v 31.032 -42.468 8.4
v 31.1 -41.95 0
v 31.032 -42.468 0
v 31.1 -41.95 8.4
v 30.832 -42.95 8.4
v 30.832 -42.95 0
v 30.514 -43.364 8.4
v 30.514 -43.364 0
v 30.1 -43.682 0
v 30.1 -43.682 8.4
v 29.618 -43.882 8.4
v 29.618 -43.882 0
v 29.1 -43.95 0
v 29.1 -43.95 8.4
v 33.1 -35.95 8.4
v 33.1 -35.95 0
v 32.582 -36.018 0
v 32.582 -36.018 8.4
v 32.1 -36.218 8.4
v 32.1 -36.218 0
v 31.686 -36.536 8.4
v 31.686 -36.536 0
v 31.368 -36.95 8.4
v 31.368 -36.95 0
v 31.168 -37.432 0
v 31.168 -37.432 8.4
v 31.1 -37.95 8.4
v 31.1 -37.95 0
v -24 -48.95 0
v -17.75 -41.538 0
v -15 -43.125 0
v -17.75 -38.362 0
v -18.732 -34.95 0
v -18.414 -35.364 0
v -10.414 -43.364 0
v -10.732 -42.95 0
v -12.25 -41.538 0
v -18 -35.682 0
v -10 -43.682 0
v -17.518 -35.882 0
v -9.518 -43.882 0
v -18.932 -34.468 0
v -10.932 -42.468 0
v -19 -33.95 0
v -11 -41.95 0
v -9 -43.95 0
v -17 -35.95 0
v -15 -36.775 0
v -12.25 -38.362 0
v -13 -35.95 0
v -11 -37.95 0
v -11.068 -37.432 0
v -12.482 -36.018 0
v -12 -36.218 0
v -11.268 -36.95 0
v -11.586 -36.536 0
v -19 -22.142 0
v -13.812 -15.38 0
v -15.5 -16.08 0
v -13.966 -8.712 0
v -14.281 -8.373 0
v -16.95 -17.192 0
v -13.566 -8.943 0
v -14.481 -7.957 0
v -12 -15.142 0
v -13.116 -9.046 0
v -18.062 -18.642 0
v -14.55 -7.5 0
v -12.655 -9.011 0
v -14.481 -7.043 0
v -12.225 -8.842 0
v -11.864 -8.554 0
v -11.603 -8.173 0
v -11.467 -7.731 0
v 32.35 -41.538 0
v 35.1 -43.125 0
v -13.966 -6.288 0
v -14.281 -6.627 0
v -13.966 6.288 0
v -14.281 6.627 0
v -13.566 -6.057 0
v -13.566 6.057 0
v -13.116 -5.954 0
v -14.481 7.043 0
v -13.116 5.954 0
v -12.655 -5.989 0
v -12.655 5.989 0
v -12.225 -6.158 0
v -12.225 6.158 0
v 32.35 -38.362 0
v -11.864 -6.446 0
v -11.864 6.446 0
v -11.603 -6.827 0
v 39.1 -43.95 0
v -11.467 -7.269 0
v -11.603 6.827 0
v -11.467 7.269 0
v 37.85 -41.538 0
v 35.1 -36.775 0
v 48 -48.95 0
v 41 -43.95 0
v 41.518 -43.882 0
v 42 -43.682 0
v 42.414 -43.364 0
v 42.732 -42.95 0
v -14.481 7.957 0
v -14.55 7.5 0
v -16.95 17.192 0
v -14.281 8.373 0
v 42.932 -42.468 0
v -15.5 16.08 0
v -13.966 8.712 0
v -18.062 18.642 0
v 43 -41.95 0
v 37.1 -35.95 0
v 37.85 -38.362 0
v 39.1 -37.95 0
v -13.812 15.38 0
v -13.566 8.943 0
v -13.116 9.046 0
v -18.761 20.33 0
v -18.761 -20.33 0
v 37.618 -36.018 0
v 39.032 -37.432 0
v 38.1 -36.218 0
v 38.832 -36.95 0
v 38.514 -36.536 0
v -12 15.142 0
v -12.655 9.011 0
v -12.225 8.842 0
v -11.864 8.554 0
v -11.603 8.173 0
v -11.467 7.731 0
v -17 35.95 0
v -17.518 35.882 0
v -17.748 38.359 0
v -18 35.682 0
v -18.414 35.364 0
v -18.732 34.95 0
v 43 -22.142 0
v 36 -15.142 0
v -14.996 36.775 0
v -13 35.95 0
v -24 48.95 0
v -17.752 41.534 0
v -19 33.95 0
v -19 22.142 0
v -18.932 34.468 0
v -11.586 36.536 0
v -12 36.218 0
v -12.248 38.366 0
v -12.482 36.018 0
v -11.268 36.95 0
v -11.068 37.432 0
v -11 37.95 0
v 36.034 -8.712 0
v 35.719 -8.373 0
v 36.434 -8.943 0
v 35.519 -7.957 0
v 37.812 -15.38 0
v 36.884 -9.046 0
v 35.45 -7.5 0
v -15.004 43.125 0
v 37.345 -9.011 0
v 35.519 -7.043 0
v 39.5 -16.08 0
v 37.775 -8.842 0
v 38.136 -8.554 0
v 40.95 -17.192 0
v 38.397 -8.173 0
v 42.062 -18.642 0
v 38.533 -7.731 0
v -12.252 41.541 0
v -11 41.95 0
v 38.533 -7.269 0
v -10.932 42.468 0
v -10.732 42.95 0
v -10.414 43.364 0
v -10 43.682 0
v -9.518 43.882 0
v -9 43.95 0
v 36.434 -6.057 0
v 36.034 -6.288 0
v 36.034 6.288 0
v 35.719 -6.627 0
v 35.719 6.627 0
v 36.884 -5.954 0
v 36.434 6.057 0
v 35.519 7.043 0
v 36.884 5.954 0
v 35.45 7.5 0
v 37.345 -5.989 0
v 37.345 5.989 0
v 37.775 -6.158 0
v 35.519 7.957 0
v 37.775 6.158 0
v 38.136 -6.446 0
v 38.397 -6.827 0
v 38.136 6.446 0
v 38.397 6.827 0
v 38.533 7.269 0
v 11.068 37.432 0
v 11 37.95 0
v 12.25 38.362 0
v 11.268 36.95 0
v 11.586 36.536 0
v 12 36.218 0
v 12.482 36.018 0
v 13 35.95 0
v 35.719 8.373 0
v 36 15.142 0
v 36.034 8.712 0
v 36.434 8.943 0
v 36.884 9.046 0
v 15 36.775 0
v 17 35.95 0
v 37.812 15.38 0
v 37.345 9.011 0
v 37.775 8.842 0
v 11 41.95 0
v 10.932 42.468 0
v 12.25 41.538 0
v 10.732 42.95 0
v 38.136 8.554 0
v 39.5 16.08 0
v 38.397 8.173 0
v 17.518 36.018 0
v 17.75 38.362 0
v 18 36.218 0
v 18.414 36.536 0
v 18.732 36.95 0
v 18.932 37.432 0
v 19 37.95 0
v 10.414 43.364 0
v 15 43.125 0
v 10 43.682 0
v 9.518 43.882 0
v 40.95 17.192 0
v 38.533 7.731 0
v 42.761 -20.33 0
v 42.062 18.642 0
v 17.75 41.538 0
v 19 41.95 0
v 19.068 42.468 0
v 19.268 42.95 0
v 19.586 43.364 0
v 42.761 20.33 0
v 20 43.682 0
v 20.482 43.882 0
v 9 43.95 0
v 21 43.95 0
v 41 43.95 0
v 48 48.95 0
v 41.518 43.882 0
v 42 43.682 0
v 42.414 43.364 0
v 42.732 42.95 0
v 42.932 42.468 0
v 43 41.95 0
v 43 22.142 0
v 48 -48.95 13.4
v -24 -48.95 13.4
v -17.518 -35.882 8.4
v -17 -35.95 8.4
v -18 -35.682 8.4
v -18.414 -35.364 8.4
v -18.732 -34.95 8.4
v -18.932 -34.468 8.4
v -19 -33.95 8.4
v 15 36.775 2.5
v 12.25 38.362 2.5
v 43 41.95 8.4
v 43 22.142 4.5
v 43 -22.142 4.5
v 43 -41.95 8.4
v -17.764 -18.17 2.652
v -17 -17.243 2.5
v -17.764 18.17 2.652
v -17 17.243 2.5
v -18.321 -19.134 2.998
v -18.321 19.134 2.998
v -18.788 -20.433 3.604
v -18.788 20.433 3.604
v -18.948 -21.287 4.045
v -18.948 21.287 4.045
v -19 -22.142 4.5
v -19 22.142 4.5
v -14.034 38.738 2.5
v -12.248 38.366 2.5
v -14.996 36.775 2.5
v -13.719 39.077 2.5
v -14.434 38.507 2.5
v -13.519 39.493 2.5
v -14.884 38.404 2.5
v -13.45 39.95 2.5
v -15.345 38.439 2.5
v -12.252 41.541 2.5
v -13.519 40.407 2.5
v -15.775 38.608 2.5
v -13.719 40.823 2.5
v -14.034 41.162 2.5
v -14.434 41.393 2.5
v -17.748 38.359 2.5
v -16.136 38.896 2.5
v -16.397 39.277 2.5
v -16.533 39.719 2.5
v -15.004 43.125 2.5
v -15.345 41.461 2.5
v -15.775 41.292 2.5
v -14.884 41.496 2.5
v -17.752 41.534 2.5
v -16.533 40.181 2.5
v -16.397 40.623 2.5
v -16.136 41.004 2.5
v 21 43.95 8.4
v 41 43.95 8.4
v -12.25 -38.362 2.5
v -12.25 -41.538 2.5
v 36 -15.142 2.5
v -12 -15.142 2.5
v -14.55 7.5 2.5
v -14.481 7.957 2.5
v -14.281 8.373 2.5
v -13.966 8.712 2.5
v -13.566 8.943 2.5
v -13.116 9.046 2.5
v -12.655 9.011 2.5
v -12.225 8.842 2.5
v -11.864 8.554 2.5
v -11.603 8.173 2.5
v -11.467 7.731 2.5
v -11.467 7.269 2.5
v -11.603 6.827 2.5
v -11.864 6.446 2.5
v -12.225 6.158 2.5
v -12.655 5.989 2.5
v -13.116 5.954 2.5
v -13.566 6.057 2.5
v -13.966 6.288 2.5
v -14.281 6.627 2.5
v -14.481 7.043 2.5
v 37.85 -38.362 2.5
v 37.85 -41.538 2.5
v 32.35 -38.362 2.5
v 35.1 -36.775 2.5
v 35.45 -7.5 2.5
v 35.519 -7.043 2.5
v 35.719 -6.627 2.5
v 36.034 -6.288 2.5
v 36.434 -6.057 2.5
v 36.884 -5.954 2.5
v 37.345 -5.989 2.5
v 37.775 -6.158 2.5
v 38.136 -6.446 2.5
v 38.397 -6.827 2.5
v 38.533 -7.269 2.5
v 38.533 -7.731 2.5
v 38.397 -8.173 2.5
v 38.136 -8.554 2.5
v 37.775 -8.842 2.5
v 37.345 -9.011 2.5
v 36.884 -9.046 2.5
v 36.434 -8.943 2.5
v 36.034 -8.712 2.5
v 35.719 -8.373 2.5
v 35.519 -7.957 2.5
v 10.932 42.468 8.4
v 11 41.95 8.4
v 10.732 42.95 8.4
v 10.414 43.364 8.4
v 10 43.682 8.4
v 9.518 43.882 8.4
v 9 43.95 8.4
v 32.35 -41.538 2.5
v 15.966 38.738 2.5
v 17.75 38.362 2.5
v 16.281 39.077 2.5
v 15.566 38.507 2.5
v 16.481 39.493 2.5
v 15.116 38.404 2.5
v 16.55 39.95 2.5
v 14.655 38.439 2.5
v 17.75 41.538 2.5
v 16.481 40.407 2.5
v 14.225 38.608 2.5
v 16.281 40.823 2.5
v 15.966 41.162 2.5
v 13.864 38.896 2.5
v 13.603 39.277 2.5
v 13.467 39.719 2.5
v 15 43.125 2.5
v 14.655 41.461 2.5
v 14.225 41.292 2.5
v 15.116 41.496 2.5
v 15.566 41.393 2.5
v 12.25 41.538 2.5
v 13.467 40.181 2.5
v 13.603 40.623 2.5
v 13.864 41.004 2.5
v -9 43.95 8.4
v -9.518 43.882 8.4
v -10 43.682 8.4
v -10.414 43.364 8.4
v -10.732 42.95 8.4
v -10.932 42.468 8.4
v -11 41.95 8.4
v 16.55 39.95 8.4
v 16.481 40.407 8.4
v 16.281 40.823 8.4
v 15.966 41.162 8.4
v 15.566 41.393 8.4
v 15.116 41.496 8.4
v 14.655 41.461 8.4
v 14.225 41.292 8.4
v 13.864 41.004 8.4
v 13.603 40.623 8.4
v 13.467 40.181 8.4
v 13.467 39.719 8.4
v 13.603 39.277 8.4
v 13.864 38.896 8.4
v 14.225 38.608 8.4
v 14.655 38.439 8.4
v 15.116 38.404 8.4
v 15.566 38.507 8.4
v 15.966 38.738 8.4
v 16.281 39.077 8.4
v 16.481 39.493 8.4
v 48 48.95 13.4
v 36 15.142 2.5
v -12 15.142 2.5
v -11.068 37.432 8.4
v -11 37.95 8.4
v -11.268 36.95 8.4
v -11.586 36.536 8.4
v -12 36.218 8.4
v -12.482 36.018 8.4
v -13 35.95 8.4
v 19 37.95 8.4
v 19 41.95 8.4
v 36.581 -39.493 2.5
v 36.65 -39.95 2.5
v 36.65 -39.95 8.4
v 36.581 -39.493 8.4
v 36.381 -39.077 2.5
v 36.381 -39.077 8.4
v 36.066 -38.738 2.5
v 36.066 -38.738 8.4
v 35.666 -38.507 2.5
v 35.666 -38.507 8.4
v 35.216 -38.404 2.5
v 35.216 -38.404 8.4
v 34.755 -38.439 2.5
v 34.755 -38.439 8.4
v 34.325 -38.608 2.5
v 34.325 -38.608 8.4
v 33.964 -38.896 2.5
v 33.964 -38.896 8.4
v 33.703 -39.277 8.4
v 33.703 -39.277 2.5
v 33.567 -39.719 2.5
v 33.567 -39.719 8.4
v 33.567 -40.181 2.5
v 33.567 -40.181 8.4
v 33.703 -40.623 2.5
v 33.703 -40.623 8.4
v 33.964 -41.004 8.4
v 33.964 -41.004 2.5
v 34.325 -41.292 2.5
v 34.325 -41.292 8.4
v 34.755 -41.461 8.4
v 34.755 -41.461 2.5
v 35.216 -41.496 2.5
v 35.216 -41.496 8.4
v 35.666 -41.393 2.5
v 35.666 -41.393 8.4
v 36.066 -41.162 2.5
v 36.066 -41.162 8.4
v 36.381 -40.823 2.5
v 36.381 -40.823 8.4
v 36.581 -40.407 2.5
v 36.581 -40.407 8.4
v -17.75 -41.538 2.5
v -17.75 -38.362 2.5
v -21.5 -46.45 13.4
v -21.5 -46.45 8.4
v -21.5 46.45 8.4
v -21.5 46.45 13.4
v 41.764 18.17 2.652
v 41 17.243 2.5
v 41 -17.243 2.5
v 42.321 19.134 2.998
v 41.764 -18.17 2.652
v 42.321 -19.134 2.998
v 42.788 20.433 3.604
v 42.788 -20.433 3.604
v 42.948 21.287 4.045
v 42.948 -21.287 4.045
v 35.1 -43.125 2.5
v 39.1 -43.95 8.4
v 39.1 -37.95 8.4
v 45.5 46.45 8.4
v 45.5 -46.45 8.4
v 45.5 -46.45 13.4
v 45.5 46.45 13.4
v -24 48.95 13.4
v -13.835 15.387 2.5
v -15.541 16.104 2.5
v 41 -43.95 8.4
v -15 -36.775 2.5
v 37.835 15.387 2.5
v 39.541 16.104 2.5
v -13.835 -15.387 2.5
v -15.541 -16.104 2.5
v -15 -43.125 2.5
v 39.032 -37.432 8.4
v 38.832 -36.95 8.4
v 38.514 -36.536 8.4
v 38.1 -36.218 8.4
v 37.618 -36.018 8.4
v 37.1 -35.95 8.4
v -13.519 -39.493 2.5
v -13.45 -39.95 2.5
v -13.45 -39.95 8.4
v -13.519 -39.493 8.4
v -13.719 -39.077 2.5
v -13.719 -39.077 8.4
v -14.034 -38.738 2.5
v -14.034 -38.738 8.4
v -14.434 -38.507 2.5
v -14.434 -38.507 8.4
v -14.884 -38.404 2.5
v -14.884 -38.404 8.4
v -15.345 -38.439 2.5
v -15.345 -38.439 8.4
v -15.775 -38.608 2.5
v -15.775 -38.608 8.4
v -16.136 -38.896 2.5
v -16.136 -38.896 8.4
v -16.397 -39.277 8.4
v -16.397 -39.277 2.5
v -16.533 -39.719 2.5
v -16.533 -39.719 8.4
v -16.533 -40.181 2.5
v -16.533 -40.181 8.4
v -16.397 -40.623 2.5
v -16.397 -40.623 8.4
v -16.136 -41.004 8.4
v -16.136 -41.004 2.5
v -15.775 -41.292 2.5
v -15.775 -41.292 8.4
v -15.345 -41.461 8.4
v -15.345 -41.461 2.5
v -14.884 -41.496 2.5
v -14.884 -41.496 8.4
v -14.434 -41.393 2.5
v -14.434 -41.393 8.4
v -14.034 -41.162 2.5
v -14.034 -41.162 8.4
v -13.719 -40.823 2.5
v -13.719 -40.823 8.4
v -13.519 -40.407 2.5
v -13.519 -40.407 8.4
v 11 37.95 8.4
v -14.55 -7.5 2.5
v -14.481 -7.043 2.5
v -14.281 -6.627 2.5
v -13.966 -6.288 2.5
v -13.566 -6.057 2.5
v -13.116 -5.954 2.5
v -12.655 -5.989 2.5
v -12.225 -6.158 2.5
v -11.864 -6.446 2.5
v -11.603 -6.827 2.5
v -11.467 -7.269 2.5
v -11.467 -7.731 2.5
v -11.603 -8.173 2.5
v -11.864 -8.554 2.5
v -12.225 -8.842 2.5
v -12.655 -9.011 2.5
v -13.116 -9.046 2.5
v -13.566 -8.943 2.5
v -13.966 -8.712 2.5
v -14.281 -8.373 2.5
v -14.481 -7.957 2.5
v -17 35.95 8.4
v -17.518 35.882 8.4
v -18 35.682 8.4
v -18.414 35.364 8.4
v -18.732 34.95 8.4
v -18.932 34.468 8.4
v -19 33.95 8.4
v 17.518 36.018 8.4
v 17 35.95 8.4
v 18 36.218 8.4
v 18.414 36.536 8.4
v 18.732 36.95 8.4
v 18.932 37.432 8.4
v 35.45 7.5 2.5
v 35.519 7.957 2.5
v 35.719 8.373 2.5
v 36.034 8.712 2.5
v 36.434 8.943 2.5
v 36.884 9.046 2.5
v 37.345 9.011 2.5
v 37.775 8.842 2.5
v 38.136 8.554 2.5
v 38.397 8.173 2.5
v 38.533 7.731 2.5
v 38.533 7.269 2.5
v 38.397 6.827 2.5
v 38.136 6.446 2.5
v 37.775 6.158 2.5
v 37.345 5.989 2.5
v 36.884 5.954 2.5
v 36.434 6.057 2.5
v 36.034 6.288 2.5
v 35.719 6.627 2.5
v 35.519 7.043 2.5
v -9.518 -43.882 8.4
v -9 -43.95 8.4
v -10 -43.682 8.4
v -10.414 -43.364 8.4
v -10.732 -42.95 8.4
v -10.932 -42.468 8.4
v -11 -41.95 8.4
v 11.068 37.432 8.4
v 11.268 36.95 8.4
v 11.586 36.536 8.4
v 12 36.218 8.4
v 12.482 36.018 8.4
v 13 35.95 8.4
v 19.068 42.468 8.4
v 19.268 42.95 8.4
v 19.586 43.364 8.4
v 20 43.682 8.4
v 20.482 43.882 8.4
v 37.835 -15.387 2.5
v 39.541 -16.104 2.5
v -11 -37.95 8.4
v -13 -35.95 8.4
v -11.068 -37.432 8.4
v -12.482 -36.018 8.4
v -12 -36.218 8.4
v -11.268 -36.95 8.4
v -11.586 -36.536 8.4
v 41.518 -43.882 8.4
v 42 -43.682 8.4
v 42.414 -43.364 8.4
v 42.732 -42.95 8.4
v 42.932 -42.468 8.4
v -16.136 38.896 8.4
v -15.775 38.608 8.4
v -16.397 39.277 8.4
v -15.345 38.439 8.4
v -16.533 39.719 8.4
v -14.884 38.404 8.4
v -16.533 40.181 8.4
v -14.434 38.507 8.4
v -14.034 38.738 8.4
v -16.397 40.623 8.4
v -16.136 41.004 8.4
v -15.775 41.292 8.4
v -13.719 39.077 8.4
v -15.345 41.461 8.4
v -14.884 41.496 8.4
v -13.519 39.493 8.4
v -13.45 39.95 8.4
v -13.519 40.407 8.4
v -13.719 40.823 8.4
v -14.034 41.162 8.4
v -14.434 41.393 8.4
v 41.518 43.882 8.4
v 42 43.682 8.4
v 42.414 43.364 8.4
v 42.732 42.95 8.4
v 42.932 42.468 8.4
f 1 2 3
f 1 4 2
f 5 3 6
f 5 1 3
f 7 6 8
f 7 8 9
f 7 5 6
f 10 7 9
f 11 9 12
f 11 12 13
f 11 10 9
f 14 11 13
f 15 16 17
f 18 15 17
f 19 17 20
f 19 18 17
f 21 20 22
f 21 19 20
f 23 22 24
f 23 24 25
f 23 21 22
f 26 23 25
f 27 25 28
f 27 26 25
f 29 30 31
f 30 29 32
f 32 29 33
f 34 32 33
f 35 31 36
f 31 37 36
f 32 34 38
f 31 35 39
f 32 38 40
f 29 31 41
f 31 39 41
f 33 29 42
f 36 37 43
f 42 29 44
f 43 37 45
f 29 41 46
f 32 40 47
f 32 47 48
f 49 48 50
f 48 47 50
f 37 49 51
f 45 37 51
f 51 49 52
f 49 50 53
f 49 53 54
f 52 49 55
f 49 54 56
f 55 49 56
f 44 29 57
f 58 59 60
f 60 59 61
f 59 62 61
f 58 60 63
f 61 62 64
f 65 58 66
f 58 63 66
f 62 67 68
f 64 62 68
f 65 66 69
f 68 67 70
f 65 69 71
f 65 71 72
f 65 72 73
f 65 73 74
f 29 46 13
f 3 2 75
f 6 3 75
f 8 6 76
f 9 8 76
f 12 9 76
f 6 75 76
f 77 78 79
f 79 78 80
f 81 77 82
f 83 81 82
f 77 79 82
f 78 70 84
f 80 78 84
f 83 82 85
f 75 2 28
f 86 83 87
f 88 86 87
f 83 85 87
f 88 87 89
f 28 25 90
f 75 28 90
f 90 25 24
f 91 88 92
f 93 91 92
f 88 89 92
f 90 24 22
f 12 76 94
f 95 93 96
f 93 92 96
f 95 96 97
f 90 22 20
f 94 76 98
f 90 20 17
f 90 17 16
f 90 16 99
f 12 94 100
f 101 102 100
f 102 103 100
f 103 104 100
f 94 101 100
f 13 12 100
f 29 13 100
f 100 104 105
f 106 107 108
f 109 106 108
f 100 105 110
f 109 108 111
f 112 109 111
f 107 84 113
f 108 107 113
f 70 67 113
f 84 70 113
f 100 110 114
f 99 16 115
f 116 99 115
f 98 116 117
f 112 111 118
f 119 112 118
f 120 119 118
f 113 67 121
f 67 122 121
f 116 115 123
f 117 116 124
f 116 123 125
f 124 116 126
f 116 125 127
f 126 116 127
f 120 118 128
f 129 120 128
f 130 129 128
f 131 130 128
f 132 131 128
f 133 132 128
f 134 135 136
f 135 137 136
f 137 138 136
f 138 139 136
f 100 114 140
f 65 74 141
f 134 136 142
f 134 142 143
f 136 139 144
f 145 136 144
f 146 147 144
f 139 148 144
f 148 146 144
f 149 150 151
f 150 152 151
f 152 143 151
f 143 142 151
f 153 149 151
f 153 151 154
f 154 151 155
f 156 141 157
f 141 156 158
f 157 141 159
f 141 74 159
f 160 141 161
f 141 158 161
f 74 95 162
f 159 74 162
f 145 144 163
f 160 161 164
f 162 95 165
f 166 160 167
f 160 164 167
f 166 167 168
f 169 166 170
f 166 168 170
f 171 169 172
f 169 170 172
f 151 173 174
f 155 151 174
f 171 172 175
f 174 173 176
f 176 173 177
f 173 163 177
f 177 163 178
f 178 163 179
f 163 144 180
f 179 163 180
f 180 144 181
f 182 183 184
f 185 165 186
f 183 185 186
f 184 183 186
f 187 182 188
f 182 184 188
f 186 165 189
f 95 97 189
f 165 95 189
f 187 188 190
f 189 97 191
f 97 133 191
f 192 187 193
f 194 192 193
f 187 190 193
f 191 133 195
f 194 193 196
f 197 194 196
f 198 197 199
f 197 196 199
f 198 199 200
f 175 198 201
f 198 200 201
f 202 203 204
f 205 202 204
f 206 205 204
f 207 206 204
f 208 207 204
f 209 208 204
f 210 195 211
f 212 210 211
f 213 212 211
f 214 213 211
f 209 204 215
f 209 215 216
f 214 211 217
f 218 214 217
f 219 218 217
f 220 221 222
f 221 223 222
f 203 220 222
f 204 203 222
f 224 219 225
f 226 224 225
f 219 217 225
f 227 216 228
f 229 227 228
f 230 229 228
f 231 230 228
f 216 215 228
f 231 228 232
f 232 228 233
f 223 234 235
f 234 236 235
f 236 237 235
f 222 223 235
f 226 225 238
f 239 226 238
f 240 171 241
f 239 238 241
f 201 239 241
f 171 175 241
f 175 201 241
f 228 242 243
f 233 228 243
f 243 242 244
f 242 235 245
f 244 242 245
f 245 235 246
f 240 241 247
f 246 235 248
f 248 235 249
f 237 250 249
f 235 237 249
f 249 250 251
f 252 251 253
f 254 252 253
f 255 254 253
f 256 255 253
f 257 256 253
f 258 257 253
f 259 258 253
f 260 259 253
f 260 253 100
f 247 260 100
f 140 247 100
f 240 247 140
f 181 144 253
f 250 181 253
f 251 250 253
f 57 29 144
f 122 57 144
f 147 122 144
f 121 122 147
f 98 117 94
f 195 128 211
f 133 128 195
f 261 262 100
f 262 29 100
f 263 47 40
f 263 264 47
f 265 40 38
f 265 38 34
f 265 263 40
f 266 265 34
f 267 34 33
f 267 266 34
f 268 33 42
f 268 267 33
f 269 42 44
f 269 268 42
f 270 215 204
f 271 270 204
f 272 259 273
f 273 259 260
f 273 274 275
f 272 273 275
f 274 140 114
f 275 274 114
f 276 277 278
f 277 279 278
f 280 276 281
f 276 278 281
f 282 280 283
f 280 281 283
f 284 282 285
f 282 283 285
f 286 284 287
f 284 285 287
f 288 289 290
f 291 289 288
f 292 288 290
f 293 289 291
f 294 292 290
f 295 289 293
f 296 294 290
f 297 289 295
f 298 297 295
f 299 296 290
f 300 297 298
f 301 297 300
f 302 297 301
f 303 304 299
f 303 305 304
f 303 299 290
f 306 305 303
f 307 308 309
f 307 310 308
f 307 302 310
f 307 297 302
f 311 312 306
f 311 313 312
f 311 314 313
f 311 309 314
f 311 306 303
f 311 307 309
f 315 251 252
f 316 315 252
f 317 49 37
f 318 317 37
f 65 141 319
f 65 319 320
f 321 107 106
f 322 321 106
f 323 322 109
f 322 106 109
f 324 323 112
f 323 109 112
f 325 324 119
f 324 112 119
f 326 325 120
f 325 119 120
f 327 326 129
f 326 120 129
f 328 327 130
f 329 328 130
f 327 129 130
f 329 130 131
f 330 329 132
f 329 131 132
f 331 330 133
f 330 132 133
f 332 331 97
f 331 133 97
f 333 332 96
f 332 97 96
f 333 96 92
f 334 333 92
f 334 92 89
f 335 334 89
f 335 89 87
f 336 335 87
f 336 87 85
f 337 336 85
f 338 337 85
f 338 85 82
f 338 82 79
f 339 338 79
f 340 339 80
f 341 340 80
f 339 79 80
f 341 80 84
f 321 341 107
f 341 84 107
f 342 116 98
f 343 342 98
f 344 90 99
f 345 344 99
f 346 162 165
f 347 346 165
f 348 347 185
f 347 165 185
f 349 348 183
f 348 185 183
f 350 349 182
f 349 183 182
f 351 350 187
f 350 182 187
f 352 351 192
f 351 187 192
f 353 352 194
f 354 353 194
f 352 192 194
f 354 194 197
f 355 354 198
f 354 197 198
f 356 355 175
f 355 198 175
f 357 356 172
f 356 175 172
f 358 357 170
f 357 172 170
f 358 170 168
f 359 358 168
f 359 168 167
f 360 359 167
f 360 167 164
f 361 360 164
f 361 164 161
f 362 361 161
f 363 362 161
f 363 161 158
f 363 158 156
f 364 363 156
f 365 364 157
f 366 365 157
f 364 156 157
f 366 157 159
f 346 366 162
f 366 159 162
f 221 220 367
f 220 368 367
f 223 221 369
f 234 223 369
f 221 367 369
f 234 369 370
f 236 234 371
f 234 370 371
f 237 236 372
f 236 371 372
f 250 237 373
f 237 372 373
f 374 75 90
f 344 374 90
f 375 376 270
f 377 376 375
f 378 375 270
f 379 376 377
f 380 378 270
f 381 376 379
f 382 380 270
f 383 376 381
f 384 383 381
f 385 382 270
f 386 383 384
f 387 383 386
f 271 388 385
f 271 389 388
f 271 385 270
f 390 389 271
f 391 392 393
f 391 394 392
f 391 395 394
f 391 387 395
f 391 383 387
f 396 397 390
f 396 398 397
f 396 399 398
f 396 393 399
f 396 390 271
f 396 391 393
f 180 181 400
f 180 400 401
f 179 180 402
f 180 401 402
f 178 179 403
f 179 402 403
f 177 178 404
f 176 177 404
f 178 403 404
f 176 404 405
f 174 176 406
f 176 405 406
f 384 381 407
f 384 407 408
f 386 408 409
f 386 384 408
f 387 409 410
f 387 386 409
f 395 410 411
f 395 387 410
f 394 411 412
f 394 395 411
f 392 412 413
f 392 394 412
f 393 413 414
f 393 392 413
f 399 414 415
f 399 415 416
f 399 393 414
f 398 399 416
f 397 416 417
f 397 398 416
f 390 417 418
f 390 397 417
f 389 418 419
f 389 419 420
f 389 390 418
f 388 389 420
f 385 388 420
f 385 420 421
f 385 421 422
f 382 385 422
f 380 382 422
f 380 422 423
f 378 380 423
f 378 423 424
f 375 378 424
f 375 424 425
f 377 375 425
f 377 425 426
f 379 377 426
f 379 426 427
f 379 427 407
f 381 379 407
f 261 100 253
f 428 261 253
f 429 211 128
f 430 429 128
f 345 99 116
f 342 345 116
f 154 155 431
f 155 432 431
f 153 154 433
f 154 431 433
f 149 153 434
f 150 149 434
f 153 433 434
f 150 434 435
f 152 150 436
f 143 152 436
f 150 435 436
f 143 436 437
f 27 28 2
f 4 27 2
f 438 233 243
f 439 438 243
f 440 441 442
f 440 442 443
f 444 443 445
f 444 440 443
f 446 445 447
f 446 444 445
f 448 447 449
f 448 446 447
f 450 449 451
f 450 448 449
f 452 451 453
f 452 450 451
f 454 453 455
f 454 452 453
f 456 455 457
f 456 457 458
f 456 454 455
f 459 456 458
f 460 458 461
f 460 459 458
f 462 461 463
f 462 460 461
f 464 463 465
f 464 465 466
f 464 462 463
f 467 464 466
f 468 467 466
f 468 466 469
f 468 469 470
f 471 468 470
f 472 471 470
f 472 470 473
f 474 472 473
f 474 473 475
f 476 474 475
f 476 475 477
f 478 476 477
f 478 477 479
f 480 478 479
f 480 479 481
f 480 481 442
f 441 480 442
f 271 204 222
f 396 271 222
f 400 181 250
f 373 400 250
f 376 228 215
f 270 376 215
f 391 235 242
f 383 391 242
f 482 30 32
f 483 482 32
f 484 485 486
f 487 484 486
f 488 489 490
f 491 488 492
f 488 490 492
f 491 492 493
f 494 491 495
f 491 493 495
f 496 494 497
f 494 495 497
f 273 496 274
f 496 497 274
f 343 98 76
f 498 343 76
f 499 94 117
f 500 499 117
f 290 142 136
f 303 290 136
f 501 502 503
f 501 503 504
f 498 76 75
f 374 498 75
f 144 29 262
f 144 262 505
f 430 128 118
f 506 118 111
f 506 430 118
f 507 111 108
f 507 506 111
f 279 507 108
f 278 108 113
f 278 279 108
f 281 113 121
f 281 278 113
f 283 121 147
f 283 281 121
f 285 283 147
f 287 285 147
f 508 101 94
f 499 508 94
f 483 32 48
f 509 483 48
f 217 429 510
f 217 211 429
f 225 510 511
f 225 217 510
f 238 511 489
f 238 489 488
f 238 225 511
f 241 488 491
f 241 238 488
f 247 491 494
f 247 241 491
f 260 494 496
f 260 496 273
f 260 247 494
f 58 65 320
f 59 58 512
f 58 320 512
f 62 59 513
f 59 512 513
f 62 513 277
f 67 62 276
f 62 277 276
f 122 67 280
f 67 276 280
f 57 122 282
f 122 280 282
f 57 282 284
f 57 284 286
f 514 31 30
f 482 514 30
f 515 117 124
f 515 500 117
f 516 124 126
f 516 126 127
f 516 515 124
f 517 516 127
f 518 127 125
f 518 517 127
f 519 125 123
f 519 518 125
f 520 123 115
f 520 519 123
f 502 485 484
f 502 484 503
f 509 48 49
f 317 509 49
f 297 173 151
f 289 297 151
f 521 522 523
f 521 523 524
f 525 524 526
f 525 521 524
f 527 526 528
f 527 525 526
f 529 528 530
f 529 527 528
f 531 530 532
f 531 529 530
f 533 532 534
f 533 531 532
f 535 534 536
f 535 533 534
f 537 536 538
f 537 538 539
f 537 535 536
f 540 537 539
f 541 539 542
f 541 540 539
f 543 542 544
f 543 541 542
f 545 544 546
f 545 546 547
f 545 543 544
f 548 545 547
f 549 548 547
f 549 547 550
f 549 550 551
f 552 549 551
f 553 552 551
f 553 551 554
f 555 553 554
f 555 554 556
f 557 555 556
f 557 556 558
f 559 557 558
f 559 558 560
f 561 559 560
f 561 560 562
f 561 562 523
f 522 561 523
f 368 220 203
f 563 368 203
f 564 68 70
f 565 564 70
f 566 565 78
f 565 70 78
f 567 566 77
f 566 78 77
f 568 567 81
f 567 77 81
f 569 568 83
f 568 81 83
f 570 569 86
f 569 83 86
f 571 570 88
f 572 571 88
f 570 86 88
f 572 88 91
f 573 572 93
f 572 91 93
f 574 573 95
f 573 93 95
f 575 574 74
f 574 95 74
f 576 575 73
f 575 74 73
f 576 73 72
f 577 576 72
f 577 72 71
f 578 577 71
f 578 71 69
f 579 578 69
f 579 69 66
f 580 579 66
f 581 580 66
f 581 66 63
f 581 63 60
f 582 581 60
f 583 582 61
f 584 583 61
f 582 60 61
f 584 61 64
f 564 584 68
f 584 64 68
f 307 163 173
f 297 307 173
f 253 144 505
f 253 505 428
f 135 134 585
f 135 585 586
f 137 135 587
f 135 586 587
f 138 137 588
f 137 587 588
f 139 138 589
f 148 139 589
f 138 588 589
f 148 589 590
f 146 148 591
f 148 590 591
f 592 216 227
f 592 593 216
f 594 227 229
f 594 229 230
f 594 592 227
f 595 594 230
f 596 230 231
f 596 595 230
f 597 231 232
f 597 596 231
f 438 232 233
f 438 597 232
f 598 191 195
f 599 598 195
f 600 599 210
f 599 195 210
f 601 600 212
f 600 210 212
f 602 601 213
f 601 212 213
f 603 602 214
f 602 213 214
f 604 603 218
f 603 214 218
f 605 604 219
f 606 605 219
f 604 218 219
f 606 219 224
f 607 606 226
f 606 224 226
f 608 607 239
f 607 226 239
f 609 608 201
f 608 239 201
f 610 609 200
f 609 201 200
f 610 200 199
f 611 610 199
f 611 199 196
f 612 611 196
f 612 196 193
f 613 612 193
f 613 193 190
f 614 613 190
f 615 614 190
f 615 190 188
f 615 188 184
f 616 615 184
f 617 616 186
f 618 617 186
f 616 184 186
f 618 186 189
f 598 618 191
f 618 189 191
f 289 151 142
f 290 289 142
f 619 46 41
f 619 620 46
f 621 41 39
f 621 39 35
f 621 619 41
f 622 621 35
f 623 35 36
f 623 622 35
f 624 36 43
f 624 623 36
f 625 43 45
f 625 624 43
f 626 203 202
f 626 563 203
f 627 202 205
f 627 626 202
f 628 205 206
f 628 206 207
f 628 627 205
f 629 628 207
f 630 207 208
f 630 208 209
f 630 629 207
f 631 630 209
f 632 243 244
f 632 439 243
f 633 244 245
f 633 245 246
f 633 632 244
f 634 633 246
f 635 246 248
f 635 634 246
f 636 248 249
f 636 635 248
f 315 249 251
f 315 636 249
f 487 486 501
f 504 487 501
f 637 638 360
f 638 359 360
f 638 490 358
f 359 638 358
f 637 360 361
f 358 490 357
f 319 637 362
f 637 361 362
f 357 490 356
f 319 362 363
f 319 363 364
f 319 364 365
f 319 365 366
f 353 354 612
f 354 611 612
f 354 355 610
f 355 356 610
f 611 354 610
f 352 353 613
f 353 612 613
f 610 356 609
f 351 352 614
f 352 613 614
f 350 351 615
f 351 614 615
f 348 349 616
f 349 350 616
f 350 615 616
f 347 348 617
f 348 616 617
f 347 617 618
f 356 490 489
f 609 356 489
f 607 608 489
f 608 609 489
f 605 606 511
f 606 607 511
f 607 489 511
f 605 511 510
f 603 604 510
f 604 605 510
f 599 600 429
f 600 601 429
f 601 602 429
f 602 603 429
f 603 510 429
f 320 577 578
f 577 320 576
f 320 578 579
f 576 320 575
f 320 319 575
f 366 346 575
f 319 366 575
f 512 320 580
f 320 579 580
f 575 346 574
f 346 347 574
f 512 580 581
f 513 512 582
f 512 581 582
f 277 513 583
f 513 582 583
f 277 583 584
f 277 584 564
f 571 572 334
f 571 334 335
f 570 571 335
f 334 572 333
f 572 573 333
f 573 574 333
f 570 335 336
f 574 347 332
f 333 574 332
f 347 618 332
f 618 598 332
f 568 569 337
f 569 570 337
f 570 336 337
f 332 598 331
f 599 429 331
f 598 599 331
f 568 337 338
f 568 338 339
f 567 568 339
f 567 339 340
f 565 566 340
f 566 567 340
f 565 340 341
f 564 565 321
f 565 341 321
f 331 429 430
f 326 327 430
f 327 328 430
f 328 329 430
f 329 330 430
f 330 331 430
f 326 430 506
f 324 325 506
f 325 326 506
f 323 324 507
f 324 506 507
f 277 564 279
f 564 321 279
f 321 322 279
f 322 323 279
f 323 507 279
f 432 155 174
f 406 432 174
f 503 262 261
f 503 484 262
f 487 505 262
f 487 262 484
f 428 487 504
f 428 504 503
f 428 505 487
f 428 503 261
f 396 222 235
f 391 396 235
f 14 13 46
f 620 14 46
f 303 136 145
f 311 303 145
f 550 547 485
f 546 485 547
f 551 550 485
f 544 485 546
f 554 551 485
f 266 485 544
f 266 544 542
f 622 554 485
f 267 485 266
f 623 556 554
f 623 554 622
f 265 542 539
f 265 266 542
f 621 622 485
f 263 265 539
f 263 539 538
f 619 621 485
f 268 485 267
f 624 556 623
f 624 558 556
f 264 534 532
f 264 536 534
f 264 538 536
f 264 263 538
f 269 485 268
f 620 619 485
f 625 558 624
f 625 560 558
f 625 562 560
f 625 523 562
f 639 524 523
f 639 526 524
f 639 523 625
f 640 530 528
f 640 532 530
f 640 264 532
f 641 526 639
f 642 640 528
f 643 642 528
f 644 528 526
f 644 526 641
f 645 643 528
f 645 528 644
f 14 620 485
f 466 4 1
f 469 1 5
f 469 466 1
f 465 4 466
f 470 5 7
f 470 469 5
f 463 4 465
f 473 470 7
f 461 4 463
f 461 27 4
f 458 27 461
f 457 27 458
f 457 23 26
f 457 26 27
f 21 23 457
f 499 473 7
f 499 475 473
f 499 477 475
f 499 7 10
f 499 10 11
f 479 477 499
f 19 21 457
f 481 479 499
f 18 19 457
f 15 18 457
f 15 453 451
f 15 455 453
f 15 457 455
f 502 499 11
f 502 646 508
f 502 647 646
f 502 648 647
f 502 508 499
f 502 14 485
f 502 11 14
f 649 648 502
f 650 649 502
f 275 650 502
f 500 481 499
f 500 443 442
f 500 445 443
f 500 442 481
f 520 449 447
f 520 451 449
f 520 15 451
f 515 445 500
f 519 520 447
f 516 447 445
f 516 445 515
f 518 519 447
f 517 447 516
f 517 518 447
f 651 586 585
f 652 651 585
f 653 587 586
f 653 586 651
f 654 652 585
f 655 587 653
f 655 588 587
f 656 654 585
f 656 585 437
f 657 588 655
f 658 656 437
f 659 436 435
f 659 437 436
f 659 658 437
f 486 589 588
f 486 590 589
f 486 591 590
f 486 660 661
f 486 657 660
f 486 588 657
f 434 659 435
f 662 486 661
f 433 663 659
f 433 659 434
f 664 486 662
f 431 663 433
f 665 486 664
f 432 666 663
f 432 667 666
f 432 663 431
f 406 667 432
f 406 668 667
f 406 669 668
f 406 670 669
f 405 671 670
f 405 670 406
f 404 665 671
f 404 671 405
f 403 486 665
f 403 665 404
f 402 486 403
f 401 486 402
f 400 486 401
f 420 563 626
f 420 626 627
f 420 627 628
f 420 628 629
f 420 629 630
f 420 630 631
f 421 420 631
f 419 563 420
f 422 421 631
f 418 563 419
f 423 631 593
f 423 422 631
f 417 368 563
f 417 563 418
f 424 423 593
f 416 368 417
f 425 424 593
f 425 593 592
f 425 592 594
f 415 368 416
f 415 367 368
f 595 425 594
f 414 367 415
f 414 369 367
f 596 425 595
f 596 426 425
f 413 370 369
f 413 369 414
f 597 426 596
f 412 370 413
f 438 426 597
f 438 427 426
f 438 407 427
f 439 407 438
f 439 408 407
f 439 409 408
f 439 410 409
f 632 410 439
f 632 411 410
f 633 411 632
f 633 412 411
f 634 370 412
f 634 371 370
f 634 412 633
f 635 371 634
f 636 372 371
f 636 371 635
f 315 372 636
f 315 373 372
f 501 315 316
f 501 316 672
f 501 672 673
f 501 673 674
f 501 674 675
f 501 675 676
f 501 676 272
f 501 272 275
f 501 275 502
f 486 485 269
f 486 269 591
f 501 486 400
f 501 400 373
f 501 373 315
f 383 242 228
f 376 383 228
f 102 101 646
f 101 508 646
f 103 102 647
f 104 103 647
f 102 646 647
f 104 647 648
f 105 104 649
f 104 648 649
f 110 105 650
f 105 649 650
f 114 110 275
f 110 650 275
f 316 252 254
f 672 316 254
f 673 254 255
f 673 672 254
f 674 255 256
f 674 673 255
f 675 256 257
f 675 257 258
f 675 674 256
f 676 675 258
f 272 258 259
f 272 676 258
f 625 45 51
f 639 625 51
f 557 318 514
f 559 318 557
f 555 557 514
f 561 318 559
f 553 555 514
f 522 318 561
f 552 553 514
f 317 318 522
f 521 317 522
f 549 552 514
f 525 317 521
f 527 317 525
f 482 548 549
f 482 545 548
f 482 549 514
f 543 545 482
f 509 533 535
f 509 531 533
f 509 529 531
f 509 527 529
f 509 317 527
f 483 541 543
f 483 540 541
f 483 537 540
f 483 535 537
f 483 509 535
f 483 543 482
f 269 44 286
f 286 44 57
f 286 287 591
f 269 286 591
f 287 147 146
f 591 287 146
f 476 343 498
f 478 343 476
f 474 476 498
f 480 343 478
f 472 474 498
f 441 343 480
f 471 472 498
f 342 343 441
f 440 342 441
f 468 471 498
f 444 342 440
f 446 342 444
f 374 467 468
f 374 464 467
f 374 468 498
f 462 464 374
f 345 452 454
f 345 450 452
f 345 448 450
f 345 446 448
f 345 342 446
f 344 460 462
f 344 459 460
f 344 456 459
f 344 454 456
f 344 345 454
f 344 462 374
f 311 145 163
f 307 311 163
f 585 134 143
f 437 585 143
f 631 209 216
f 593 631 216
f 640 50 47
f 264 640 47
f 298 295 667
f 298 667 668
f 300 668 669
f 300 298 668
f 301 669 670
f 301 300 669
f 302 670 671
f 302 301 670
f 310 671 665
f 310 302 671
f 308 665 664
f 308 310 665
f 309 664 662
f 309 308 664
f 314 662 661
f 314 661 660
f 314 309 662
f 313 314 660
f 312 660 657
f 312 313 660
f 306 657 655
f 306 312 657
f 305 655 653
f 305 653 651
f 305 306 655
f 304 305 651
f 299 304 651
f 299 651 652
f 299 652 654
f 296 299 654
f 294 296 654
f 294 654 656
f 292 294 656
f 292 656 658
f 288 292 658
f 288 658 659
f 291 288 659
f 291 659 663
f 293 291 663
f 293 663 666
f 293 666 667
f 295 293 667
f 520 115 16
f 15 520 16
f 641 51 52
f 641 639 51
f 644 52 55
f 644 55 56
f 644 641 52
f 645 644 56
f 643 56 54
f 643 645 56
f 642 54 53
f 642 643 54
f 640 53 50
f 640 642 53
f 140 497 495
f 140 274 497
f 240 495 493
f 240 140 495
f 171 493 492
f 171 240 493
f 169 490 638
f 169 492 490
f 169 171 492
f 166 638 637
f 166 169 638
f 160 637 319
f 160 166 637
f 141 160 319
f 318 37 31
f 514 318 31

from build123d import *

# Parameters (mm, degrees)
ESQUISSE1_W             = 72
ESQUISSE1_H             = 97.9
ESQUISSE1_R             = 1.55
BOSS_EXTRU_1_DEPTH      = 8.4
ENL_V_MAT_EXTRU_1_DEPTH = 2.5
ESQUISSE3_W             = 72
ESQUISSE3_H             = 97.9
ESQUISSE3_W_2           = 67
ESQUISSE3_H_2           = 92.9
BOSS_EXTRU_2_DEPTH      = 5
ESQUISSE4_W             = 72
ESQUISSE4_H             = 30.283908022
ESQUISSE4_R             = 1.55
BOSS_EXTRU_3_DEPTH      = 2.5
CONG_2_R                = 7
CONG_4_R                = 2


with BuildPart() as part:
    # Esquisse1 → Boss.-Extru.1 (new body)
    with BuildSketch(Plane.XY):
        with Locations((12, 0)):
            Rectangle(ESQUISSE1_W, ESQUISSE1_H)
        with Locations((15, 39.95)):
            Circle(ESQUISSE1_R, mode=Mode.SUBTRACT)
        with Locations((-15, 39.95)):
            Circle(ESQUISSE1_R, mode=Mode.SUBTRACT)
        with Locations((-15, -39.95)):
            Circle(ESQUISSE1_R, mode=Mode.SUBTRACT)
        with Locations((35.1, -39.95)):
            Circle(ESQUISSE1_R, mode=Mode.SUBTRACT)
        Polygon((-19, 35.95), (-11, 35.95), (-11, 43.95), (11, 43.95), (11, 35.95), (19, 35.95), (19, 43.95), (43, 43.95), (43, -43.95), (39.1, -43.95), (39.1, -35.95), (31.1, -35.95), (31.1, -43.95), (-11, -43.95), (-11, -35.95), (-19, -35.95), align=None, mode=Mode.SUBTRACT)
    extrude(amount=BOSS_EXTRU_1_DEPTH)

    # Esquisse2 → Enlèv. mat.-Extru.1 (cut)
    with BuildSketch(Plane(origin=(0, 0, 0), x_dir=(-1, 0, 0), z_dir=(0, 0, -1))):
        Polygon((-15, 36.774573519), (-12.25, 38.36228676), (-12.25, 41.53771324), (-15, 43.125426481), (-17.75, 41.53771324), (-17.75, 38.36228676), align=None)
        Polygon((14.996275716, 36.774575703), (17.748135966, 38.359062527), (17.751860251, 41.534486823), (15.003724284, 43.125424297), (12.251864034, 41.540937473), (12.248139749, 38.365513177), align=None)
        Polygon((15, -43.125426481), (17.75, -41.53771324), (17.75, -38.36228676), (15, -36.774573519), (12.25, -38.36228676), (12.25, -41.53771324), align=None)
        Polygon((-35.1, -43.125426481), (-32.35, -41.53771324), (-32.35, -38.36228676), (-35.1, -36.774573519), (-37.85, -38.36228676), (-37.85, -41.53771324), align=None)
    extrude(amount=-ENL_V_MAT_EXTRU_1_DEPTH, mode=Mode.SUBTRACT)

    # Esquisse3 → Boss.-Extru.2 (add)
    with BuildSketch(Plane.XY.offset(8.4)):
        with Locations((12, 0)):
            Rectangle(ESQUISSE3_W, ESQUISSE3_H)
        with Locations((12, 0)):
            Rectangle(ESQUISSE3_W_2, ESQUISSE3_H_2, mode=Mode.SUBTRACT)
    extrude(amount=BOSS_EXTRU_2_DEPTH)

    # Esquisse4 → Boss.-Extru.3 (add)
    with BuildSketch(Plane(origin=(0, 0, 0), x_dir=(-1, 0, 0), z_dir=(0, 0, -1))):
        with Locations((-12, 0)):
            Rectangle(ESQUISSE4_W, ESQUISSE4_H)
        with Locations((-37, 7.5)):
            Circle(ESQUISSE4_R, mode=Mode.SUBTRACT)
        with Locations((-37, -7.5)):
            Circle(ESQUISSE4_R, mode=Mode.SUBTRACT)
        with Locations((13, -7.5)):
            Circle(ESQUISSE4_R, mode=Mode.SUBTRACT)
        with Locations((13, 7.5)):
            Circle(ESQUISSE4_R, mode=Mode.SUBTRACT)
    extrude(amount=-BOSS_EXTRU_3_DEPTH)

    # Congé2
    cong_2_edges = [part.edges().sort_by_distance(p)[0] for p in [
        (43, -15.141954011, 1.25),
        (43, 15.141954011, 1.25),
        (-19, 15.141954011, 1.25),
        (-19, -15.141954011, 1.25),
    ]]
    fillet(cong_2_edges, radius=CONG_2_R)

    # Congé4
    cong_4_edges = [part.edges().sort_by_distance(p)[0] for p in [
        (43, 0, 2.5),
        (-19, 0, 2.5),
        (-19, 35.95, 4.2),
        (-19, -35.95, 4.2),
        (-11, -35.95, 4.2),
        (-11, -43.95, 4.2),
        (31.1, -43.95, 4.2),
        (31.1, -35.95, 4.2),
        (39.1, -35.95, 4.2),
        (43, -43.95, 4.2),
        (43, 43.95, 4.2),
        (19, 43.95, 4.2),
        (19, 35.95, 4.2),
        (11, 35.95, 4.2),
        (11, 43.95, 4.2),
        (-11, 43.95, 4.2),
        (-11, 35.95, 4.2),
    ]]
    fillet(cong_4_edges, radius=CONG_4_R)


solid = part.part
